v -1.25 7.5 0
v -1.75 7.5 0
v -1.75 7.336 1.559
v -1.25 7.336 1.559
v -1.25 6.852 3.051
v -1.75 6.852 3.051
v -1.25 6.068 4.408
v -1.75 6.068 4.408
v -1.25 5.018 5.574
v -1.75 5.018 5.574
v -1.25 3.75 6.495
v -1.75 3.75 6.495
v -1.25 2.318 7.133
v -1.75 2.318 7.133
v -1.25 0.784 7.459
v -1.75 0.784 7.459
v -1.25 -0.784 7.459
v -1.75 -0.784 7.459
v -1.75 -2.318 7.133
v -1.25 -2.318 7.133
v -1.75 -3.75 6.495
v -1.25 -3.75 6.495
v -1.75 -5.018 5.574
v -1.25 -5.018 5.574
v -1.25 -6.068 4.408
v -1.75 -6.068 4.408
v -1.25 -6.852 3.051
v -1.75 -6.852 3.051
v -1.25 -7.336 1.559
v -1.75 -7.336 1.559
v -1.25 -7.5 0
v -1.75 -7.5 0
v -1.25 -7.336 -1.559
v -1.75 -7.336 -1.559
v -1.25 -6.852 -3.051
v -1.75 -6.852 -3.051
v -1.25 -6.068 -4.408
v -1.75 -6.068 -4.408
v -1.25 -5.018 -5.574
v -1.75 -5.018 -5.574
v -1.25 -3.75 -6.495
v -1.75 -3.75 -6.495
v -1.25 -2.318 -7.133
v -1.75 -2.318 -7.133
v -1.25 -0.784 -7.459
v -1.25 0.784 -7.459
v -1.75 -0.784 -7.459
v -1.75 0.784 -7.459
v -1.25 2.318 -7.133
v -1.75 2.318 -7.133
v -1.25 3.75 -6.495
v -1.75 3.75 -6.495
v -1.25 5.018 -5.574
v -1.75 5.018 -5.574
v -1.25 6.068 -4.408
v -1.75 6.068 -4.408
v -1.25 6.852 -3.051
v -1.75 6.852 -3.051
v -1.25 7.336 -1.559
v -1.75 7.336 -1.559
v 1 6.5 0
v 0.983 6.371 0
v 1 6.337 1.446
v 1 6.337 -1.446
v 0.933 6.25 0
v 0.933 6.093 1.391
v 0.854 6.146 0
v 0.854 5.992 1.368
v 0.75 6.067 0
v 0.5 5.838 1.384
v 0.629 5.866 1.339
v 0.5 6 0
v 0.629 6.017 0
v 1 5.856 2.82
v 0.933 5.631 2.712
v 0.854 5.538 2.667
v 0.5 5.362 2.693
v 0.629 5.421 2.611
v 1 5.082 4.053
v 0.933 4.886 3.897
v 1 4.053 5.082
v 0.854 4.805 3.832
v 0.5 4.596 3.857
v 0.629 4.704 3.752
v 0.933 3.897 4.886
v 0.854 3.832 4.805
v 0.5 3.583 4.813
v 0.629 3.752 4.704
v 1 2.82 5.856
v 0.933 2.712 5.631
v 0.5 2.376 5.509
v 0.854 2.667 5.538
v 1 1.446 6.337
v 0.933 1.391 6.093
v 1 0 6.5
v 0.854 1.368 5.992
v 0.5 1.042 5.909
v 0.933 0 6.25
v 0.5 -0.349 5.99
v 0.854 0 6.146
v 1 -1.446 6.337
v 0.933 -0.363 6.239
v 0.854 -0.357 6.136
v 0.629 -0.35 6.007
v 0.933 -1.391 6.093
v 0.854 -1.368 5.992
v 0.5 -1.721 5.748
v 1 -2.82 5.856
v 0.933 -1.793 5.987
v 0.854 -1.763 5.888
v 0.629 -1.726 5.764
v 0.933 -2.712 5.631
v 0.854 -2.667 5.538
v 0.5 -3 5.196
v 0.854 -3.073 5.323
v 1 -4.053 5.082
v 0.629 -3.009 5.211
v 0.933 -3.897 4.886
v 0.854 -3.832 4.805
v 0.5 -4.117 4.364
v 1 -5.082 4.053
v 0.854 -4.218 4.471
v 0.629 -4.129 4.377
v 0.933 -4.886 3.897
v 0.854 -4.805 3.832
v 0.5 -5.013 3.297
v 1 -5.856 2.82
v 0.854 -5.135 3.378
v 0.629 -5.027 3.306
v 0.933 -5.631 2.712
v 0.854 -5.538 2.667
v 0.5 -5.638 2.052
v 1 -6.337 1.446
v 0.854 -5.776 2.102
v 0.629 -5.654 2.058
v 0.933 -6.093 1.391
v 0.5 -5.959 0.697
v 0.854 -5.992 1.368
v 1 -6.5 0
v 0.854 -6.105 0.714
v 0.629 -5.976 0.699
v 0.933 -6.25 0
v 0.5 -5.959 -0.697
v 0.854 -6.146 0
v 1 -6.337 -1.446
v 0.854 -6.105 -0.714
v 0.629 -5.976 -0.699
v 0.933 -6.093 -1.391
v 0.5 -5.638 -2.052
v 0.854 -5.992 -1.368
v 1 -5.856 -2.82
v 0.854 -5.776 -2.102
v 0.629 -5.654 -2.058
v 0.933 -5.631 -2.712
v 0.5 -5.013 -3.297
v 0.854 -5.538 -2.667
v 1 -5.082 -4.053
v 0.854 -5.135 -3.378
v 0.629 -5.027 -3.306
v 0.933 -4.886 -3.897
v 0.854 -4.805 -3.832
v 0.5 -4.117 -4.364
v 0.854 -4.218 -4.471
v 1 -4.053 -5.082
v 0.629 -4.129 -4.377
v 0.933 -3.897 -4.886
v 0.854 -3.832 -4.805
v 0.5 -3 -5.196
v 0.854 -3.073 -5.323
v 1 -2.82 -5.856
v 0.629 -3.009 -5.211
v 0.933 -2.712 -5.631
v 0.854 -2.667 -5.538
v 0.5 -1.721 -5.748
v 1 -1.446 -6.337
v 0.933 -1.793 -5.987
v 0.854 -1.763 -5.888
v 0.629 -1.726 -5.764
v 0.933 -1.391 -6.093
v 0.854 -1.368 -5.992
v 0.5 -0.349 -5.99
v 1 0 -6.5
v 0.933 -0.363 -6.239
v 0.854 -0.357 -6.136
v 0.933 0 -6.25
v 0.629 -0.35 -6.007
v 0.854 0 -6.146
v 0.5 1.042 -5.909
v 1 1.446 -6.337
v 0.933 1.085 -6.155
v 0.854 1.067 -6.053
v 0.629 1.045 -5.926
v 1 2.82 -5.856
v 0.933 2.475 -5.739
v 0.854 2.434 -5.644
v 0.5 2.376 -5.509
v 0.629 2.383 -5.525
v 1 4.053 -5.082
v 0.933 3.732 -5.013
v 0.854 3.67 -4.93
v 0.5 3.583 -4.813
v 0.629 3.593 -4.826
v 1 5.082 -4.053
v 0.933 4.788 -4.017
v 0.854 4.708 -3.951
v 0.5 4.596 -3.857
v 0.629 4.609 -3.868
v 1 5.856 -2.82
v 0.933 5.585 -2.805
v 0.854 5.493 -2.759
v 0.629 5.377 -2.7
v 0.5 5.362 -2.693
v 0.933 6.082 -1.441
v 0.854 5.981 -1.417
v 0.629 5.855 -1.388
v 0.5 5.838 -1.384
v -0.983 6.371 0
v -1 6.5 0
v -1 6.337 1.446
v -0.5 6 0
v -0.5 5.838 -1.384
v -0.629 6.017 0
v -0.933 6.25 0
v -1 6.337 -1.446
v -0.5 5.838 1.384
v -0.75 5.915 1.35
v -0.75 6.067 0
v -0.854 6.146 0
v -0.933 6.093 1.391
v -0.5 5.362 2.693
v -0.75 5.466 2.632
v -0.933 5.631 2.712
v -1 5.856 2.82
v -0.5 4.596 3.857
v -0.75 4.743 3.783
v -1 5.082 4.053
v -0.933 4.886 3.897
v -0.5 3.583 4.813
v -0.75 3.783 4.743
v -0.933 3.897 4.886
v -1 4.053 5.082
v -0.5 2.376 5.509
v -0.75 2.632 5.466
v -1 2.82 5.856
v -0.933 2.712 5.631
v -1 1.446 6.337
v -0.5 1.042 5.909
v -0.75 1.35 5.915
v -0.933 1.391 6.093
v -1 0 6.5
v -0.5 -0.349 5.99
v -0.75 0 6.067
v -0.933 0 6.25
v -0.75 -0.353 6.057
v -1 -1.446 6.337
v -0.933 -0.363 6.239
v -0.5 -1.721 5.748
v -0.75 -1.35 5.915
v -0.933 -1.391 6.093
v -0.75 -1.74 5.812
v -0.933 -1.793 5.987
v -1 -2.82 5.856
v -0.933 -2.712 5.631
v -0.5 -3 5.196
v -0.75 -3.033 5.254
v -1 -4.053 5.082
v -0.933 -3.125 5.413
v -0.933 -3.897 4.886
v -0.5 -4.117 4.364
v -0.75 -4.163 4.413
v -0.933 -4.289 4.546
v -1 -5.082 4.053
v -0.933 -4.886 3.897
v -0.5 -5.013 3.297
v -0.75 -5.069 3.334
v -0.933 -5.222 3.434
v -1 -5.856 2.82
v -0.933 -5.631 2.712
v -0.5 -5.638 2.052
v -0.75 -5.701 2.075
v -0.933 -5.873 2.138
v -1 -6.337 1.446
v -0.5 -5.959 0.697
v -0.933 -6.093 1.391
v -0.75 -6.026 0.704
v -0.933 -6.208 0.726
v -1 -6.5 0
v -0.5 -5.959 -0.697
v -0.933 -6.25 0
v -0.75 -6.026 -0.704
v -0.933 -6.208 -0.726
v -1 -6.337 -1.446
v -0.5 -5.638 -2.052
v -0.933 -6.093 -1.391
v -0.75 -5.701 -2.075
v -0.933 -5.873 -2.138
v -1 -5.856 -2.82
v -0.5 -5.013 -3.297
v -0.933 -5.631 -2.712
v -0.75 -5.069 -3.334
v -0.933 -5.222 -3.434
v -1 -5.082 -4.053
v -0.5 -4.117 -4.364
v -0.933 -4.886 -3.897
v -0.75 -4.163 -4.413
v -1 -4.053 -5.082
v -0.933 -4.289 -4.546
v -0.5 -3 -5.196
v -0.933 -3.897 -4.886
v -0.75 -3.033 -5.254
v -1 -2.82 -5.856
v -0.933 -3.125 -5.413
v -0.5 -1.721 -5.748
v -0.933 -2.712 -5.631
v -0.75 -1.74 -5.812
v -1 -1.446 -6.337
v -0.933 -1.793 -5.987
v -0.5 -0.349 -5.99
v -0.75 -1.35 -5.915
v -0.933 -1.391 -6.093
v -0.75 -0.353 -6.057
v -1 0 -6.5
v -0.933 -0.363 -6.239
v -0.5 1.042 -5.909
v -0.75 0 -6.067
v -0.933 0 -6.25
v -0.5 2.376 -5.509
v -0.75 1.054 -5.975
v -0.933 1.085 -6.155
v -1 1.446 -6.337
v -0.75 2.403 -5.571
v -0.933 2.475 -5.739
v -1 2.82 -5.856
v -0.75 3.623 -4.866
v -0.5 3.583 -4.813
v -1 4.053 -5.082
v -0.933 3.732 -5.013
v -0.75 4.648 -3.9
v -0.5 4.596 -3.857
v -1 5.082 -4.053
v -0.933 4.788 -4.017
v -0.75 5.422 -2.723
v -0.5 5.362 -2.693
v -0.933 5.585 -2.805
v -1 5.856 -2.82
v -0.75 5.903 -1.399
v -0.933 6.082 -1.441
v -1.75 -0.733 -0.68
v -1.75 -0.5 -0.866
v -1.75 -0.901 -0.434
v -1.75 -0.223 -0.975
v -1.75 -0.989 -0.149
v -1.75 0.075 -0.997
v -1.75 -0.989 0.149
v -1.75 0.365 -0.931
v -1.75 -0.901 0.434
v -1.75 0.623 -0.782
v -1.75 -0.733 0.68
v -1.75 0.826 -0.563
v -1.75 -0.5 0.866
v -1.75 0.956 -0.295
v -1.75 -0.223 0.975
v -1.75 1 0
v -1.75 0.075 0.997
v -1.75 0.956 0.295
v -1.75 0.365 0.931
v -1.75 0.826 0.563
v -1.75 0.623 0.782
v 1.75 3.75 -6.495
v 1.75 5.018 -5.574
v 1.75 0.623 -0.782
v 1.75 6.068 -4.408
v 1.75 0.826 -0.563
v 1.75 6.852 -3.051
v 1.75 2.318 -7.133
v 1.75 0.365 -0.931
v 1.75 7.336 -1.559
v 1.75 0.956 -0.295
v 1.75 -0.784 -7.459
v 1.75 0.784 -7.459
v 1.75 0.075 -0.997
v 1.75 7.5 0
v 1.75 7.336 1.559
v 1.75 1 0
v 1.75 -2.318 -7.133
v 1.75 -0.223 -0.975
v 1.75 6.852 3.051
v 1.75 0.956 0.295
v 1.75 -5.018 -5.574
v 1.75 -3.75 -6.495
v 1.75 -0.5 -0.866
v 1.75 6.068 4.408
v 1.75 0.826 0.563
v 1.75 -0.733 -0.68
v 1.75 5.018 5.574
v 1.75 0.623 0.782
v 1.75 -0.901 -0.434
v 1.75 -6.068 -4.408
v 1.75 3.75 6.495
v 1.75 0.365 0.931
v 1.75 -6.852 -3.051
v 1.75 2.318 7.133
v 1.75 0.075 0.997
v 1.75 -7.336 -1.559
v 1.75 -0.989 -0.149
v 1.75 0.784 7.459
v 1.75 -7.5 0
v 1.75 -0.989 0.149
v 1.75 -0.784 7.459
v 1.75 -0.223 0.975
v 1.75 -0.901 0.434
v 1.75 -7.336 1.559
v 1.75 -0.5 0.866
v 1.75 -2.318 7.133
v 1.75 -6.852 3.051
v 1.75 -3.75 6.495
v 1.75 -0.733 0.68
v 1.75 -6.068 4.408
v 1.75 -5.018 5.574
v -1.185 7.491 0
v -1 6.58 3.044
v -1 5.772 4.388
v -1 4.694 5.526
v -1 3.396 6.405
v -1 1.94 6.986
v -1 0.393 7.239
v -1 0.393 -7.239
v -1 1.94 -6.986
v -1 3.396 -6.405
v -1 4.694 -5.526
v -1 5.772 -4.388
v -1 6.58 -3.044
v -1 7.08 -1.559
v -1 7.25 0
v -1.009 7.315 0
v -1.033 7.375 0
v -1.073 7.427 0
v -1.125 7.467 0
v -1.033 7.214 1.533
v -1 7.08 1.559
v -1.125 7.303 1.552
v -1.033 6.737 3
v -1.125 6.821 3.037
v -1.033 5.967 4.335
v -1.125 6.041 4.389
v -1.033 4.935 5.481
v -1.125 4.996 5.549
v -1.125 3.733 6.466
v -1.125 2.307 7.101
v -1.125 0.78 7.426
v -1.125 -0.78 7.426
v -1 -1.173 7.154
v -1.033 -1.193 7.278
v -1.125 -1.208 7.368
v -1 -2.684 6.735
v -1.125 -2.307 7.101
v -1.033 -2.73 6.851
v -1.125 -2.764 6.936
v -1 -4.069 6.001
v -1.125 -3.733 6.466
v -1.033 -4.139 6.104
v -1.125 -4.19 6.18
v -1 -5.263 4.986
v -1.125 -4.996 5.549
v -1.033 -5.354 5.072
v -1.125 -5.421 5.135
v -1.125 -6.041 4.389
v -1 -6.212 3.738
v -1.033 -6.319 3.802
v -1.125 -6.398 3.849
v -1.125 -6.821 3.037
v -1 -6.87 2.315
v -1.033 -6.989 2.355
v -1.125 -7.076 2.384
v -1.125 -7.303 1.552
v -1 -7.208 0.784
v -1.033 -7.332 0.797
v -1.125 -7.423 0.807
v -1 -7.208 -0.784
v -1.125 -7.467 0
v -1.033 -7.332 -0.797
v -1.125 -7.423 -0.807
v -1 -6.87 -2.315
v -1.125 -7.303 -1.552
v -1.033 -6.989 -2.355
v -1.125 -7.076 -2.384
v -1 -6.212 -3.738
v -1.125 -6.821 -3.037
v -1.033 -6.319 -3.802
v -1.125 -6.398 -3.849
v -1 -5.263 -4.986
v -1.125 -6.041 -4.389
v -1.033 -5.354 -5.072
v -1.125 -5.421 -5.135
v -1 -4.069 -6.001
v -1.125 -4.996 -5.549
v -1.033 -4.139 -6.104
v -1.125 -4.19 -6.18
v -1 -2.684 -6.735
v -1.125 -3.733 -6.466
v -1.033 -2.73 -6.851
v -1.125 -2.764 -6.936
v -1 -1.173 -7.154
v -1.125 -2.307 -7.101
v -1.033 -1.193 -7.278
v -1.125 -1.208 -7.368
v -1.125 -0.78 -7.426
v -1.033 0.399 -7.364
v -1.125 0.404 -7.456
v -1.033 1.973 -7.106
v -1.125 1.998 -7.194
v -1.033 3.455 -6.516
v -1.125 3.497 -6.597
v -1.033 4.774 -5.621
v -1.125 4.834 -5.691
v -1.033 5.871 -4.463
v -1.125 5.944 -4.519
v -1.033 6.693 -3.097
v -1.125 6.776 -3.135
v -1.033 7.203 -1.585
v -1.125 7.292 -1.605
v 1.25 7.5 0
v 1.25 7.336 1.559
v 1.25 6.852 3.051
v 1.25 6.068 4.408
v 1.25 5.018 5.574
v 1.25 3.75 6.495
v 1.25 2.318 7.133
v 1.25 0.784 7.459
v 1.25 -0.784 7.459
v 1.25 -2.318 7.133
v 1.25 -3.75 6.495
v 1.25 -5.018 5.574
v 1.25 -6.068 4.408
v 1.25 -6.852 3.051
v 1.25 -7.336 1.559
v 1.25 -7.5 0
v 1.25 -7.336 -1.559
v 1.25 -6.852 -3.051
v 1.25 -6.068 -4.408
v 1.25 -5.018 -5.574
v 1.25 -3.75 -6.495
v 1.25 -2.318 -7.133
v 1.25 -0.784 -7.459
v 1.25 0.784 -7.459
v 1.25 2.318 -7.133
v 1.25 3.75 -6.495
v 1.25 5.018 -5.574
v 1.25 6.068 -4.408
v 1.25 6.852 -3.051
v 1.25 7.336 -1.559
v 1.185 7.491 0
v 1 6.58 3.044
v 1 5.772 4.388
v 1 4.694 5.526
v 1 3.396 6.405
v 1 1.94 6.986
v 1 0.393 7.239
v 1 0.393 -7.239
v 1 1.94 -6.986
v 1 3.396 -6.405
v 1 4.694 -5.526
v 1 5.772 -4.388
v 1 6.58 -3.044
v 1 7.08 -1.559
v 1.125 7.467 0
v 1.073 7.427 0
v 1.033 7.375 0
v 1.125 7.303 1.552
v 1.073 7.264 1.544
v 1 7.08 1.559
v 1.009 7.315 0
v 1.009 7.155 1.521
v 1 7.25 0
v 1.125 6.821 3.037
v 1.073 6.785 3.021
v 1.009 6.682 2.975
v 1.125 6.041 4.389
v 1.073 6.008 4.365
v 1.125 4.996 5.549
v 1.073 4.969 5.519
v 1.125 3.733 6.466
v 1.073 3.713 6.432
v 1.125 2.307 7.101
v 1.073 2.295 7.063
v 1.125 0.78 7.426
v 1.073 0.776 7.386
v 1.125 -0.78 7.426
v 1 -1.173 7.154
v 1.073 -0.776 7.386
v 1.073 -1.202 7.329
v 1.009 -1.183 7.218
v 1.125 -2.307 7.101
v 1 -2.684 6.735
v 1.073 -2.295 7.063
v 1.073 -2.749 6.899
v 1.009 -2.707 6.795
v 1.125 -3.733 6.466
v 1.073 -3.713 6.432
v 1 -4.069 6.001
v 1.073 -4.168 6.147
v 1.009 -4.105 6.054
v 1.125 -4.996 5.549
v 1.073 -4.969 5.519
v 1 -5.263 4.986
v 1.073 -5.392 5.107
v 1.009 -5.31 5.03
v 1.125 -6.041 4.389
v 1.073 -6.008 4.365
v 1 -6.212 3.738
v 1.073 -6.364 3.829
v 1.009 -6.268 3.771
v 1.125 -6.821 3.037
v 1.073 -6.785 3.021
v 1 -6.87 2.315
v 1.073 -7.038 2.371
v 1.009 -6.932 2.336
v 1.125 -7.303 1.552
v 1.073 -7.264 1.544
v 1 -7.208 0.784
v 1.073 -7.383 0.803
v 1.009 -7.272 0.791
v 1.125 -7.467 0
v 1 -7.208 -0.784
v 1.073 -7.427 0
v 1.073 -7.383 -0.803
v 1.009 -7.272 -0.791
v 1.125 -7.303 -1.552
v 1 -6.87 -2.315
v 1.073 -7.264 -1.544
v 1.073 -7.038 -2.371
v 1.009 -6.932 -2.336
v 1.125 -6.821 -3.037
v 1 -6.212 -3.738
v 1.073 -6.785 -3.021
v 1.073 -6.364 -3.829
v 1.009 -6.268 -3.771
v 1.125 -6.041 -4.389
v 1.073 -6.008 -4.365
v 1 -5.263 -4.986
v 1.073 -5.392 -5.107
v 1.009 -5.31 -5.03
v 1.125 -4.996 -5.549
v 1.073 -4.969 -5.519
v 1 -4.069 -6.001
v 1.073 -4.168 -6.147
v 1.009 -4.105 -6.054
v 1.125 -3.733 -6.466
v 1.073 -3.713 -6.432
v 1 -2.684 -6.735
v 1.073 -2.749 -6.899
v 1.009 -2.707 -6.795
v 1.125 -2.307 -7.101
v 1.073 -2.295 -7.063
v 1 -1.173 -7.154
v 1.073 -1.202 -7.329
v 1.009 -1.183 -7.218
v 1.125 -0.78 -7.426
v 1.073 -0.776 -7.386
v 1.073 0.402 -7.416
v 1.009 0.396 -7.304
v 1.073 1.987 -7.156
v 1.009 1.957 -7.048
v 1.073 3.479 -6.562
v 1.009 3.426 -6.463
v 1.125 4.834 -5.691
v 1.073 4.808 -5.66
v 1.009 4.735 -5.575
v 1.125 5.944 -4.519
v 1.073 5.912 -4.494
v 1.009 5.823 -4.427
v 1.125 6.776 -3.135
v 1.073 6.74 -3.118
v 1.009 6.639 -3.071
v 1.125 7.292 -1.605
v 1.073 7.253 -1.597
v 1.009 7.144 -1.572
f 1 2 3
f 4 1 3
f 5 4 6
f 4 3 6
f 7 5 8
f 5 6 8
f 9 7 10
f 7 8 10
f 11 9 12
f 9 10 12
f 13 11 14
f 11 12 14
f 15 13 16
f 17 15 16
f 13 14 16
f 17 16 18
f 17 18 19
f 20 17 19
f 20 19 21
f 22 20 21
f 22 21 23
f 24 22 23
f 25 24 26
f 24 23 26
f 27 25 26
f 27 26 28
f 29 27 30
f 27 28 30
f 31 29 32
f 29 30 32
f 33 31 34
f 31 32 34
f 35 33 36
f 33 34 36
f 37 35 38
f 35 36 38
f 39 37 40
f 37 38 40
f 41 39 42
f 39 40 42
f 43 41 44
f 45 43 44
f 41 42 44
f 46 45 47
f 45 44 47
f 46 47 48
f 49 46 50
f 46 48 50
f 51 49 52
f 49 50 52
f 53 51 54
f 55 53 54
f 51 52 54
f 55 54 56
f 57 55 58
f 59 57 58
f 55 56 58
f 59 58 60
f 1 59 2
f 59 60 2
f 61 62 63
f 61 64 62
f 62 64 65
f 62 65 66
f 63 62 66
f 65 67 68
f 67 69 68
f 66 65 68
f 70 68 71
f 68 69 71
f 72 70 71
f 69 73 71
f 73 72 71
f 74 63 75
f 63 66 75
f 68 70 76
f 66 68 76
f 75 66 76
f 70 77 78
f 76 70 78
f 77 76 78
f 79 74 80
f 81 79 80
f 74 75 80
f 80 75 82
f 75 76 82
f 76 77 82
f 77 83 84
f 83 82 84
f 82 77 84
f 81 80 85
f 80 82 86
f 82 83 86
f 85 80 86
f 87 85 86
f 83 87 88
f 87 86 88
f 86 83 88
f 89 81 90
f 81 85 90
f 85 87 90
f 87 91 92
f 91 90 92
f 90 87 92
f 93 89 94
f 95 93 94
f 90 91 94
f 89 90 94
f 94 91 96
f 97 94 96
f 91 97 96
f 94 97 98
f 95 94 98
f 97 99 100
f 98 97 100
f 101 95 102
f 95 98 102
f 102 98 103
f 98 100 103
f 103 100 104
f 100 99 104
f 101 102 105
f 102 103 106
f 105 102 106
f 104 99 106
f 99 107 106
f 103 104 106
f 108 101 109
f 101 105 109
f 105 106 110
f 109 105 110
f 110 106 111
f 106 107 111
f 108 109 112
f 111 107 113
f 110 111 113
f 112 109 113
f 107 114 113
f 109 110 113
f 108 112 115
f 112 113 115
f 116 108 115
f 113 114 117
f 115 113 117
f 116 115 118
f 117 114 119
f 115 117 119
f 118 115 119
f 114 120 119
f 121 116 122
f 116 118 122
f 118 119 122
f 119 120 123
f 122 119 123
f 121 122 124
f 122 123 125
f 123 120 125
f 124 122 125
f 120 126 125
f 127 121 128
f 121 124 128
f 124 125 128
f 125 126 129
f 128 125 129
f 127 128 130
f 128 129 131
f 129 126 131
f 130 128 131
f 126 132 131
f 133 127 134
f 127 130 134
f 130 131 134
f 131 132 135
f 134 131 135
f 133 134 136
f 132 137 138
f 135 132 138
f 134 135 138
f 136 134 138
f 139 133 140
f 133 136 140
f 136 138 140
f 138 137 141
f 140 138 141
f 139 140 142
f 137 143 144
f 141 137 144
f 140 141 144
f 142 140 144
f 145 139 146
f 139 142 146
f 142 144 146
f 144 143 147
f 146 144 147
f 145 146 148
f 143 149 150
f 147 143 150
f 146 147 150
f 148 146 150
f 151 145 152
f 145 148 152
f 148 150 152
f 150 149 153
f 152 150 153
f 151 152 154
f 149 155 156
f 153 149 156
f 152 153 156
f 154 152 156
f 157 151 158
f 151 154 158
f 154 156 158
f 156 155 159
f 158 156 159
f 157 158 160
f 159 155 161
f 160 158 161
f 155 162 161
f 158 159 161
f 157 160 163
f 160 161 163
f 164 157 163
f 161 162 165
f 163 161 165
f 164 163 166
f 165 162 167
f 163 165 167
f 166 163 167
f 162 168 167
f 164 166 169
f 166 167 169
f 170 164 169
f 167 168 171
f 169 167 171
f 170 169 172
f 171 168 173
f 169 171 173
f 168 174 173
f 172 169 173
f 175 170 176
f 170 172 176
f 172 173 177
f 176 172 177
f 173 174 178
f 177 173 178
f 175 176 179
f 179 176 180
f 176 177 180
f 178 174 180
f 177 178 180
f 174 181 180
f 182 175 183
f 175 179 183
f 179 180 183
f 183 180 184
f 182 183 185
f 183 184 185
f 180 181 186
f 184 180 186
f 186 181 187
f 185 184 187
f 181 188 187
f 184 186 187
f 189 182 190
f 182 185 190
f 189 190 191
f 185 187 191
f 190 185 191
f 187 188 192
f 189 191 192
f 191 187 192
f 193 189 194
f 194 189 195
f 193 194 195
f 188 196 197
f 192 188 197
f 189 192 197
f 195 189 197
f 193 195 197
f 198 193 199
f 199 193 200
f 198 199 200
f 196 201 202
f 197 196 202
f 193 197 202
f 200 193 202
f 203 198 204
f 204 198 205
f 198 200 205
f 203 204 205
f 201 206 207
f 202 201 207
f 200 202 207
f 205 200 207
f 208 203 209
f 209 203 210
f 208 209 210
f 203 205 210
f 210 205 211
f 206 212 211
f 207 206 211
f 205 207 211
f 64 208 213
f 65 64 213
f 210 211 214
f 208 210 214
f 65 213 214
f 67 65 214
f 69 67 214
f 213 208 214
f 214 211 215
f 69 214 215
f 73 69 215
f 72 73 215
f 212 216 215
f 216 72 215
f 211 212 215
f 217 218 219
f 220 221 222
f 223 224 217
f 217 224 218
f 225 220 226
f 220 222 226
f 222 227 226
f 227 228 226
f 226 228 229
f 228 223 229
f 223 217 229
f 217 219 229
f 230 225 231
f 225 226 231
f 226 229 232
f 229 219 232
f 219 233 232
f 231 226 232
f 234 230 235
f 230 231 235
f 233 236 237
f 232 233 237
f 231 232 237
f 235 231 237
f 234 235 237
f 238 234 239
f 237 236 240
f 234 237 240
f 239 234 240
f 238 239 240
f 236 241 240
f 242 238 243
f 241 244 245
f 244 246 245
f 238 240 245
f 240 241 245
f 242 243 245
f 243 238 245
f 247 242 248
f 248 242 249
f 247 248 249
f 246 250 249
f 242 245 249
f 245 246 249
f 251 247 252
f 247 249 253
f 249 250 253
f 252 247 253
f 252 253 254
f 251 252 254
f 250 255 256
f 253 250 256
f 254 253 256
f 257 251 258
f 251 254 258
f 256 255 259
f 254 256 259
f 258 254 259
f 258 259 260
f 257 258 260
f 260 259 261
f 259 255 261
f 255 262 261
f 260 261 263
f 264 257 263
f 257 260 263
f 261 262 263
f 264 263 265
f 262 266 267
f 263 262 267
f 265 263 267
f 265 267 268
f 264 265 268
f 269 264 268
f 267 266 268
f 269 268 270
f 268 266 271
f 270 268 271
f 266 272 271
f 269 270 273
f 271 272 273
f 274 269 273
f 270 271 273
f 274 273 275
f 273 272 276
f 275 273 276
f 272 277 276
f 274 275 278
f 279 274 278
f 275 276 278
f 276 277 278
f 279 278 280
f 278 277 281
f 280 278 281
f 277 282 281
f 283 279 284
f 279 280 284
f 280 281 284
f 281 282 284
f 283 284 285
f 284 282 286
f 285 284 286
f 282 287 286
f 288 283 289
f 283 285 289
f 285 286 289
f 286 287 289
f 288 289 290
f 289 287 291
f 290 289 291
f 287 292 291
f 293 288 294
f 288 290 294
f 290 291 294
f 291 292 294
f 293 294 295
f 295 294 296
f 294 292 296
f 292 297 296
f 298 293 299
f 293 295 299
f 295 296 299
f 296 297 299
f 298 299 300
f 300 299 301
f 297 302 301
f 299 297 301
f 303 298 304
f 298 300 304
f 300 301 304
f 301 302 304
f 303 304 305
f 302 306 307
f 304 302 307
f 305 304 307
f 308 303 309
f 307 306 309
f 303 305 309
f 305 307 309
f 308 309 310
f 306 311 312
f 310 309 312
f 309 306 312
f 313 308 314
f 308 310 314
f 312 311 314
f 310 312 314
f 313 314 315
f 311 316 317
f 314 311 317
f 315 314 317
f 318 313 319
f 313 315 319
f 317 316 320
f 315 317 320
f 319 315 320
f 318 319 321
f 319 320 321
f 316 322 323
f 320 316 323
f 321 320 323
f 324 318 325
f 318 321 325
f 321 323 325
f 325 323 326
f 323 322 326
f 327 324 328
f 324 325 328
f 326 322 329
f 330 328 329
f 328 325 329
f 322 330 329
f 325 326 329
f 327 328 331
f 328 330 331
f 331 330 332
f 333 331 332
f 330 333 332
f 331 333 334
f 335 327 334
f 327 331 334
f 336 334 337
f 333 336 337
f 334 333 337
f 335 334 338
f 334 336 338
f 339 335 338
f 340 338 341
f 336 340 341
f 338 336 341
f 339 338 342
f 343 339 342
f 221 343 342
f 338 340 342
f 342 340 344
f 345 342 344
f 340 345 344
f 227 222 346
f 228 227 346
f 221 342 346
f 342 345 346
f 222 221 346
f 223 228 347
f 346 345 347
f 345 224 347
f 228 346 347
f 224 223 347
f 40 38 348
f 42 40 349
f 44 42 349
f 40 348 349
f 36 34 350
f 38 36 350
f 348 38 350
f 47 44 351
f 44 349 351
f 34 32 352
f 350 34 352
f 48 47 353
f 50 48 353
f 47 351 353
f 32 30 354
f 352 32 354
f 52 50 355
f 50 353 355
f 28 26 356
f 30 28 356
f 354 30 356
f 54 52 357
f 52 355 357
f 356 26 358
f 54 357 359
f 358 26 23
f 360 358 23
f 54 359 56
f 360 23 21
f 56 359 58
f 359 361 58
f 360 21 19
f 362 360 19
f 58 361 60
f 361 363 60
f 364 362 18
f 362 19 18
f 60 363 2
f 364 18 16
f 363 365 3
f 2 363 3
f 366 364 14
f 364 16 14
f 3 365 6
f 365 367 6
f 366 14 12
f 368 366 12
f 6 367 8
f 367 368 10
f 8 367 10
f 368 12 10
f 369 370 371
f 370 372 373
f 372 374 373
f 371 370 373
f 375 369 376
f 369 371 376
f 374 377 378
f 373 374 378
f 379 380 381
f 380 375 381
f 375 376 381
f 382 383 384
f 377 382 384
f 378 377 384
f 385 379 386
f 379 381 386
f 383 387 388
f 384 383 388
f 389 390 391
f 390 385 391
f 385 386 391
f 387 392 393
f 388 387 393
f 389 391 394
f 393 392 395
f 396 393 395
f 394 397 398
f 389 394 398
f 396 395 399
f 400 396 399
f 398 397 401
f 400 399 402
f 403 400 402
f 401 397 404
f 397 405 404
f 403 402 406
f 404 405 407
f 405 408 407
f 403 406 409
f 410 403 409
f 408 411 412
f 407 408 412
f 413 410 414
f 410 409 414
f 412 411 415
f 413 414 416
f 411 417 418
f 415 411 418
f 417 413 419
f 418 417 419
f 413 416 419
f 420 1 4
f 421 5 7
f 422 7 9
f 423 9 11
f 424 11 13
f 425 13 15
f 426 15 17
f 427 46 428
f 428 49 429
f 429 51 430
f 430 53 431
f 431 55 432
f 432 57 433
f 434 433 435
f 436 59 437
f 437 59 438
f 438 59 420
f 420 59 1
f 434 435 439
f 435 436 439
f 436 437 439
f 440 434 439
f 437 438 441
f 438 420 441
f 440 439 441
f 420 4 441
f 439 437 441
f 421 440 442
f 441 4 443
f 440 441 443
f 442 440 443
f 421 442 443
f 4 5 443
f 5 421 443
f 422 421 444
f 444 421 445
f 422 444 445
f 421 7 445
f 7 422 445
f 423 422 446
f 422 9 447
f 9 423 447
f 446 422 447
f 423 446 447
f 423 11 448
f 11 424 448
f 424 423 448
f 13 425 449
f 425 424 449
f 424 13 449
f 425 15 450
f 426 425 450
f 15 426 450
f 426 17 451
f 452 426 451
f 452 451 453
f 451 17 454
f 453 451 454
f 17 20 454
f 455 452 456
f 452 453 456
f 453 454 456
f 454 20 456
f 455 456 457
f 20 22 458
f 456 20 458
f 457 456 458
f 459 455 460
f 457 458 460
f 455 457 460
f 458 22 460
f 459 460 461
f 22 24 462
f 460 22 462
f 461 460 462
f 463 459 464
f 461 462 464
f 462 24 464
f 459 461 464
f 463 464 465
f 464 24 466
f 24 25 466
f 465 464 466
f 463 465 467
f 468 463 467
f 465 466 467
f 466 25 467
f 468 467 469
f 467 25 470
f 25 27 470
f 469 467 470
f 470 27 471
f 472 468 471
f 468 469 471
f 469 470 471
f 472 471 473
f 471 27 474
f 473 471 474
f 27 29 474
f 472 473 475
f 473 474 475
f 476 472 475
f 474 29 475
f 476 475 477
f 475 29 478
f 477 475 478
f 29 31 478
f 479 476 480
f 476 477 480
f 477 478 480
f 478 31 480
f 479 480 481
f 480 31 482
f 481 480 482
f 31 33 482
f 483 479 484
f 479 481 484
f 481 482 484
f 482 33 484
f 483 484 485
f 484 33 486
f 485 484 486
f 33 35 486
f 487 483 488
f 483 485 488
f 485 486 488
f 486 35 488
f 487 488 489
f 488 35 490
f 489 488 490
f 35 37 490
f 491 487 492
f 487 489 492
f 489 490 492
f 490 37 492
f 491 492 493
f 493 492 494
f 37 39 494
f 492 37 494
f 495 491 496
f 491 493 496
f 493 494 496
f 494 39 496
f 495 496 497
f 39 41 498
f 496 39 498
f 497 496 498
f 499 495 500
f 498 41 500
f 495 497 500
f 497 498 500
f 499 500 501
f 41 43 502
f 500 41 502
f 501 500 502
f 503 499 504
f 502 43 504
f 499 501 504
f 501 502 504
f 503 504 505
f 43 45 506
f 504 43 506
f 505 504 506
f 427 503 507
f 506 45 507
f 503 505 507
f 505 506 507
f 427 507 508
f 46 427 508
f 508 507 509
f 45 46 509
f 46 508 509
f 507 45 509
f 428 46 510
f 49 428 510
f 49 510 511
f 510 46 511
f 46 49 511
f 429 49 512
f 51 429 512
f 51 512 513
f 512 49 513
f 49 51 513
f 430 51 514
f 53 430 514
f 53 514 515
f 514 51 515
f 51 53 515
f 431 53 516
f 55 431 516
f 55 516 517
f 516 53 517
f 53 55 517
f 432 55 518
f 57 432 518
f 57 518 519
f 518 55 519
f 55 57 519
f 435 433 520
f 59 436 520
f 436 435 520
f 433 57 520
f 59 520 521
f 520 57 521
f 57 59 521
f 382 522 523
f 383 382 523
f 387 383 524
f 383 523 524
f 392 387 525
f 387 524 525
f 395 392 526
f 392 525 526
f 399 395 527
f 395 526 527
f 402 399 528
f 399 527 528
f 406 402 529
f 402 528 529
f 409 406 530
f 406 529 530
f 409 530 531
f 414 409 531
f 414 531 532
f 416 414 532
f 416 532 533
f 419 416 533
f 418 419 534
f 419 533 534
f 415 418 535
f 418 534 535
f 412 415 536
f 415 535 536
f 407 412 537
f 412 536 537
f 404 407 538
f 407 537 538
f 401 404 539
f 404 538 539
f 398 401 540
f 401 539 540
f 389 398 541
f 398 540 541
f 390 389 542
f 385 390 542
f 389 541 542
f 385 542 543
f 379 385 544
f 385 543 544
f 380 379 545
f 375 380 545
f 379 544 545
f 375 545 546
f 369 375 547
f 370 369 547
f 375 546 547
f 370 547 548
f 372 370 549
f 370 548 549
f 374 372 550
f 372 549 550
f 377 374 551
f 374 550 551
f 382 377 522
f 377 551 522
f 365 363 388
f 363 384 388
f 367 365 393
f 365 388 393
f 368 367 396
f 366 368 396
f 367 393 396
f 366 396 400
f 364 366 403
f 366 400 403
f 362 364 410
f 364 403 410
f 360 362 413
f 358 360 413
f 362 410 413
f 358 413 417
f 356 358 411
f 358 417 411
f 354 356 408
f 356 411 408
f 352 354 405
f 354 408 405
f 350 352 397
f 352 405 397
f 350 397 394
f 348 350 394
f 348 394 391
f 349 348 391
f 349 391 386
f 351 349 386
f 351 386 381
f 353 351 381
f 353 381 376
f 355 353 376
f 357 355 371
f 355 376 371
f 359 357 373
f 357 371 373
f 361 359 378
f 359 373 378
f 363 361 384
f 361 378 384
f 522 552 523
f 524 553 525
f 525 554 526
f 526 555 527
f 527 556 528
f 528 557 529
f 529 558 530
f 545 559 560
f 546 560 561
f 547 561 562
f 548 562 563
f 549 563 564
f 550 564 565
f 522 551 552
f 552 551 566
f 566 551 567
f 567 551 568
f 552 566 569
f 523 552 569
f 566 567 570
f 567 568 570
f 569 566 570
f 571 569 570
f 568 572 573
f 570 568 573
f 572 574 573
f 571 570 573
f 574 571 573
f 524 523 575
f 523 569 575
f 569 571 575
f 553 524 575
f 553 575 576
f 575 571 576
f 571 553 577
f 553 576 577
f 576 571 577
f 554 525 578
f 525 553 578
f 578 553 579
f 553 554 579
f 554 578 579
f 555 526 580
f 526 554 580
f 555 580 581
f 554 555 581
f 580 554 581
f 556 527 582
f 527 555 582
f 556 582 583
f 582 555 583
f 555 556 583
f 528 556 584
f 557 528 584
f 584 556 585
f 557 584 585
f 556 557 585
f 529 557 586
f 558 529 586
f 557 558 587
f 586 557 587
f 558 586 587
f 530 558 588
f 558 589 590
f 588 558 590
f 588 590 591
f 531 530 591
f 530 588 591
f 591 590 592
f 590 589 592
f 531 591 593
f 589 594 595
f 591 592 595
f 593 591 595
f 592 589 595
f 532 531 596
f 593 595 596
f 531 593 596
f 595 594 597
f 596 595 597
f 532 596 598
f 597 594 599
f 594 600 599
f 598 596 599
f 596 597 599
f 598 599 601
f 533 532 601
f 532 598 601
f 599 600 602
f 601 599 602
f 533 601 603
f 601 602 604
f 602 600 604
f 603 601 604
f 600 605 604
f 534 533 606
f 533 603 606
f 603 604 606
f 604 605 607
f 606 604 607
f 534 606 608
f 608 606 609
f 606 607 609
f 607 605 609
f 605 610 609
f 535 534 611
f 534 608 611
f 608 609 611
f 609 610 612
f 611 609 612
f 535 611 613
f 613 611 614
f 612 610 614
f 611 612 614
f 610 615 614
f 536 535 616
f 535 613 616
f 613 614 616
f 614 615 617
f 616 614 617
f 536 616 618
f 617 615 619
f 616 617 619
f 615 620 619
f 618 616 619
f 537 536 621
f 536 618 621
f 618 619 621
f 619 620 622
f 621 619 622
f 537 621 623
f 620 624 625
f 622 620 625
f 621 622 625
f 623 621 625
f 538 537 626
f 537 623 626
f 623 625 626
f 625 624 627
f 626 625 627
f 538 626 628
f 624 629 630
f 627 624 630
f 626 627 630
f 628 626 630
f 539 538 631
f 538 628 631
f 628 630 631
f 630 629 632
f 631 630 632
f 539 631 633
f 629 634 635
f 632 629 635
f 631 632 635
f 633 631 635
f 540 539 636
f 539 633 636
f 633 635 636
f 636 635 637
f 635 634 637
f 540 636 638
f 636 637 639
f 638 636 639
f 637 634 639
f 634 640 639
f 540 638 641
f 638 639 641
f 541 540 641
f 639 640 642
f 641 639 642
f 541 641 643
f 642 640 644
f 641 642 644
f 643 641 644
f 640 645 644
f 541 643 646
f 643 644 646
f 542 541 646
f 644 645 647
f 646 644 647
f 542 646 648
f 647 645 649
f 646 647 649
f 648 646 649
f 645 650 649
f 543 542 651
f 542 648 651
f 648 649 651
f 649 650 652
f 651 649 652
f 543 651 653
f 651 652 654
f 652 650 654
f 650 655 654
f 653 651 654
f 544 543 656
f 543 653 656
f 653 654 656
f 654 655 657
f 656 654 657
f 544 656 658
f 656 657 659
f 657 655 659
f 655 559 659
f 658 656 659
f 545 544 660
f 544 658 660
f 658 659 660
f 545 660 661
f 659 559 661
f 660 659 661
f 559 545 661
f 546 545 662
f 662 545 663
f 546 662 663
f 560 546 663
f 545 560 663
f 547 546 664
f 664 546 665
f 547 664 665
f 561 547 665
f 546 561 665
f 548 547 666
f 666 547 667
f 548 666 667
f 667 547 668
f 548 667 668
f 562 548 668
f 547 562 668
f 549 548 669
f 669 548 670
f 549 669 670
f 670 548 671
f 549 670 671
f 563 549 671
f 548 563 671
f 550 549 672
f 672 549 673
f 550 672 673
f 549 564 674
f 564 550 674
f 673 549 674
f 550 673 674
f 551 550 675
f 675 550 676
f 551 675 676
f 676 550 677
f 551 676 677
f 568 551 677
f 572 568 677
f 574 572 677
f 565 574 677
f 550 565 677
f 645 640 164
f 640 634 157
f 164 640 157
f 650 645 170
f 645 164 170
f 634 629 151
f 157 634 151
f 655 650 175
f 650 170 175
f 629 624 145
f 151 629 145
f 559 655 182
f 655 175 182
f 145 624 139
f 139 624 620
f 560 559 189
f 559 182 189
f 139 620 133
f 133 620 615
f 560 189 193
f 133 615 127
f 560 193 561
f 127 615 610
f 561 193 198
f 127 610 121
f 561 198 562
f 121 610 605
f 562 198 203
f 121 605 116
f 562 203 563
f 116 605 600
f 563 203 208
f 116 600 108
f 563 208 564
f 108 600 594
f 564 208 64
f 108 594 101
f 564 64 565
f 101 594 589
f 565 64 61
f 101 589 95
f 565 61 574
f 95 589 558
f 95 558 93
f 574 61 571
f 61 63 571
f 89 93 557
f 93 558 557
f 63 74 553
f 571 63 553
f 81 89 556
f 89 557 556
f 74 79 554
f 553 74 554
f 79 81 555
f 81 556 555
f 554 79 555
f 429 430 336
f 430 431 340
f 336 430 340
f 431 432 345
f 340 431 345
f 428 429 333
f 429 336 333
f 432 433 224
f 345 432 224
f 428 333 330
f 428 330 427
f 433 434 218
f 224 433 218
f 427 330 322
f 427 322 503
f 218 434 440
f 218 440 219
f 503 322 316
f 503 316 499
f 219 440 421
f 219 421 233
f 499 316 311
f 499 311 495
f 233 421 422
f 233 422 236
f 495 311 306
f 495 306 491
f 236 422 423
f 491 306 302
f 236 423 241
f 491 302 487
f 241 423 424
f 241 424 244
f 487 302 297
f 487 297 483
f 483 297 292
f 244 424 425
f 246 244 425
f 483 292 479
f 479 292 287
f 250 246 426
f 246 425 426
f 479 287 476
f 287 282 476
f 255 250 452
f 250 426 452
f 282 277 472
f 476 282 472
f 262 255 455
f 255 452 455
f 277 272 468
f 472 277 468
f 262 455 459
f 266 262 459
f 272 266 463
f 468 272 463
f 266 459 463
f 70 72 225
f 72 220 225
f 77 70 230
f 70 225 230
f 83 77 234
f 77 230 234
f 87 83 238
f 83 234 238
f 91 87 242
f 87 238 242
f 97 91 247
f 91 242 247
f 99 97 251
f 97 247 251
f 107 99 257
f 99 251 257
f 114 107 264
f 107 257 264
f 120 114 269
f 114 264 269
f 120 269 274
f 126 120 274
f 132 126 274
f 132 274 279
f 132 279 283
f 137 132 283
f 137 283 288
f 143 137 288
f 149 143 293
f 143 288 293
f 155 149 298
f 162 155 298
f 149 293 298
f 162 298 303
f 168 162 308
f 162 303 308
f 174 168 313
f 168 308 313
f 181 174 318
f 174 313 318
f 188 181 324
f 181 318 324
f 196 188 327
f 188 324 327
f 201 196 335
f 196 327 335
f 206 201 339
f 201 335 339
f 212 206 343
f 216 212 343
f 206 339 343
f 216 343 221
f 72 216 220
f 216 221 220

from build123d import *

# Parameters (mm, degrees)
FILLET1_R = 0.25


with BuildPart() as part:
    # Sketch1 → Revolve1 (revolve)
    with BuildSketch(Plane.XY):
        with BuildLine():
            Line((-1.75, 1), (1.75, 1))
            Line((1.75, 1), (1.75, 7.5))
            Line((1.75, 7.5), (1, 7.5))
            Line((1, 7.5), (1, 6.5))
            ThreePointArc((1, 6.5), (0.853553391, 6.146446609), (0.5, 6))
            Line((0.5, 6), (-0.5, 6))
            ThreePointArc((-0.5, 6), (-0.853553391, 6.146446609), (-1, 6.5))
            Line((-1, 6.5), (-1, 7.5))
            Line((-1, 7.5), (-1.75, 7.5))
            Line((-1.75, 7.5), (-1.75, 1))
        make_face()
    revolve(axis=Axis((0, 0, 0), (1, 0, 0)))

    # Fillet1
    fillet1_edges = [part.edges().sort_by_distance(p)[0] for p in [
        (1, -7.5, 0),
        (-1, -7.5, 0),
    ]]
    fillet(fillet1_edges, radius=FILLET1_R)


solid = part.part
